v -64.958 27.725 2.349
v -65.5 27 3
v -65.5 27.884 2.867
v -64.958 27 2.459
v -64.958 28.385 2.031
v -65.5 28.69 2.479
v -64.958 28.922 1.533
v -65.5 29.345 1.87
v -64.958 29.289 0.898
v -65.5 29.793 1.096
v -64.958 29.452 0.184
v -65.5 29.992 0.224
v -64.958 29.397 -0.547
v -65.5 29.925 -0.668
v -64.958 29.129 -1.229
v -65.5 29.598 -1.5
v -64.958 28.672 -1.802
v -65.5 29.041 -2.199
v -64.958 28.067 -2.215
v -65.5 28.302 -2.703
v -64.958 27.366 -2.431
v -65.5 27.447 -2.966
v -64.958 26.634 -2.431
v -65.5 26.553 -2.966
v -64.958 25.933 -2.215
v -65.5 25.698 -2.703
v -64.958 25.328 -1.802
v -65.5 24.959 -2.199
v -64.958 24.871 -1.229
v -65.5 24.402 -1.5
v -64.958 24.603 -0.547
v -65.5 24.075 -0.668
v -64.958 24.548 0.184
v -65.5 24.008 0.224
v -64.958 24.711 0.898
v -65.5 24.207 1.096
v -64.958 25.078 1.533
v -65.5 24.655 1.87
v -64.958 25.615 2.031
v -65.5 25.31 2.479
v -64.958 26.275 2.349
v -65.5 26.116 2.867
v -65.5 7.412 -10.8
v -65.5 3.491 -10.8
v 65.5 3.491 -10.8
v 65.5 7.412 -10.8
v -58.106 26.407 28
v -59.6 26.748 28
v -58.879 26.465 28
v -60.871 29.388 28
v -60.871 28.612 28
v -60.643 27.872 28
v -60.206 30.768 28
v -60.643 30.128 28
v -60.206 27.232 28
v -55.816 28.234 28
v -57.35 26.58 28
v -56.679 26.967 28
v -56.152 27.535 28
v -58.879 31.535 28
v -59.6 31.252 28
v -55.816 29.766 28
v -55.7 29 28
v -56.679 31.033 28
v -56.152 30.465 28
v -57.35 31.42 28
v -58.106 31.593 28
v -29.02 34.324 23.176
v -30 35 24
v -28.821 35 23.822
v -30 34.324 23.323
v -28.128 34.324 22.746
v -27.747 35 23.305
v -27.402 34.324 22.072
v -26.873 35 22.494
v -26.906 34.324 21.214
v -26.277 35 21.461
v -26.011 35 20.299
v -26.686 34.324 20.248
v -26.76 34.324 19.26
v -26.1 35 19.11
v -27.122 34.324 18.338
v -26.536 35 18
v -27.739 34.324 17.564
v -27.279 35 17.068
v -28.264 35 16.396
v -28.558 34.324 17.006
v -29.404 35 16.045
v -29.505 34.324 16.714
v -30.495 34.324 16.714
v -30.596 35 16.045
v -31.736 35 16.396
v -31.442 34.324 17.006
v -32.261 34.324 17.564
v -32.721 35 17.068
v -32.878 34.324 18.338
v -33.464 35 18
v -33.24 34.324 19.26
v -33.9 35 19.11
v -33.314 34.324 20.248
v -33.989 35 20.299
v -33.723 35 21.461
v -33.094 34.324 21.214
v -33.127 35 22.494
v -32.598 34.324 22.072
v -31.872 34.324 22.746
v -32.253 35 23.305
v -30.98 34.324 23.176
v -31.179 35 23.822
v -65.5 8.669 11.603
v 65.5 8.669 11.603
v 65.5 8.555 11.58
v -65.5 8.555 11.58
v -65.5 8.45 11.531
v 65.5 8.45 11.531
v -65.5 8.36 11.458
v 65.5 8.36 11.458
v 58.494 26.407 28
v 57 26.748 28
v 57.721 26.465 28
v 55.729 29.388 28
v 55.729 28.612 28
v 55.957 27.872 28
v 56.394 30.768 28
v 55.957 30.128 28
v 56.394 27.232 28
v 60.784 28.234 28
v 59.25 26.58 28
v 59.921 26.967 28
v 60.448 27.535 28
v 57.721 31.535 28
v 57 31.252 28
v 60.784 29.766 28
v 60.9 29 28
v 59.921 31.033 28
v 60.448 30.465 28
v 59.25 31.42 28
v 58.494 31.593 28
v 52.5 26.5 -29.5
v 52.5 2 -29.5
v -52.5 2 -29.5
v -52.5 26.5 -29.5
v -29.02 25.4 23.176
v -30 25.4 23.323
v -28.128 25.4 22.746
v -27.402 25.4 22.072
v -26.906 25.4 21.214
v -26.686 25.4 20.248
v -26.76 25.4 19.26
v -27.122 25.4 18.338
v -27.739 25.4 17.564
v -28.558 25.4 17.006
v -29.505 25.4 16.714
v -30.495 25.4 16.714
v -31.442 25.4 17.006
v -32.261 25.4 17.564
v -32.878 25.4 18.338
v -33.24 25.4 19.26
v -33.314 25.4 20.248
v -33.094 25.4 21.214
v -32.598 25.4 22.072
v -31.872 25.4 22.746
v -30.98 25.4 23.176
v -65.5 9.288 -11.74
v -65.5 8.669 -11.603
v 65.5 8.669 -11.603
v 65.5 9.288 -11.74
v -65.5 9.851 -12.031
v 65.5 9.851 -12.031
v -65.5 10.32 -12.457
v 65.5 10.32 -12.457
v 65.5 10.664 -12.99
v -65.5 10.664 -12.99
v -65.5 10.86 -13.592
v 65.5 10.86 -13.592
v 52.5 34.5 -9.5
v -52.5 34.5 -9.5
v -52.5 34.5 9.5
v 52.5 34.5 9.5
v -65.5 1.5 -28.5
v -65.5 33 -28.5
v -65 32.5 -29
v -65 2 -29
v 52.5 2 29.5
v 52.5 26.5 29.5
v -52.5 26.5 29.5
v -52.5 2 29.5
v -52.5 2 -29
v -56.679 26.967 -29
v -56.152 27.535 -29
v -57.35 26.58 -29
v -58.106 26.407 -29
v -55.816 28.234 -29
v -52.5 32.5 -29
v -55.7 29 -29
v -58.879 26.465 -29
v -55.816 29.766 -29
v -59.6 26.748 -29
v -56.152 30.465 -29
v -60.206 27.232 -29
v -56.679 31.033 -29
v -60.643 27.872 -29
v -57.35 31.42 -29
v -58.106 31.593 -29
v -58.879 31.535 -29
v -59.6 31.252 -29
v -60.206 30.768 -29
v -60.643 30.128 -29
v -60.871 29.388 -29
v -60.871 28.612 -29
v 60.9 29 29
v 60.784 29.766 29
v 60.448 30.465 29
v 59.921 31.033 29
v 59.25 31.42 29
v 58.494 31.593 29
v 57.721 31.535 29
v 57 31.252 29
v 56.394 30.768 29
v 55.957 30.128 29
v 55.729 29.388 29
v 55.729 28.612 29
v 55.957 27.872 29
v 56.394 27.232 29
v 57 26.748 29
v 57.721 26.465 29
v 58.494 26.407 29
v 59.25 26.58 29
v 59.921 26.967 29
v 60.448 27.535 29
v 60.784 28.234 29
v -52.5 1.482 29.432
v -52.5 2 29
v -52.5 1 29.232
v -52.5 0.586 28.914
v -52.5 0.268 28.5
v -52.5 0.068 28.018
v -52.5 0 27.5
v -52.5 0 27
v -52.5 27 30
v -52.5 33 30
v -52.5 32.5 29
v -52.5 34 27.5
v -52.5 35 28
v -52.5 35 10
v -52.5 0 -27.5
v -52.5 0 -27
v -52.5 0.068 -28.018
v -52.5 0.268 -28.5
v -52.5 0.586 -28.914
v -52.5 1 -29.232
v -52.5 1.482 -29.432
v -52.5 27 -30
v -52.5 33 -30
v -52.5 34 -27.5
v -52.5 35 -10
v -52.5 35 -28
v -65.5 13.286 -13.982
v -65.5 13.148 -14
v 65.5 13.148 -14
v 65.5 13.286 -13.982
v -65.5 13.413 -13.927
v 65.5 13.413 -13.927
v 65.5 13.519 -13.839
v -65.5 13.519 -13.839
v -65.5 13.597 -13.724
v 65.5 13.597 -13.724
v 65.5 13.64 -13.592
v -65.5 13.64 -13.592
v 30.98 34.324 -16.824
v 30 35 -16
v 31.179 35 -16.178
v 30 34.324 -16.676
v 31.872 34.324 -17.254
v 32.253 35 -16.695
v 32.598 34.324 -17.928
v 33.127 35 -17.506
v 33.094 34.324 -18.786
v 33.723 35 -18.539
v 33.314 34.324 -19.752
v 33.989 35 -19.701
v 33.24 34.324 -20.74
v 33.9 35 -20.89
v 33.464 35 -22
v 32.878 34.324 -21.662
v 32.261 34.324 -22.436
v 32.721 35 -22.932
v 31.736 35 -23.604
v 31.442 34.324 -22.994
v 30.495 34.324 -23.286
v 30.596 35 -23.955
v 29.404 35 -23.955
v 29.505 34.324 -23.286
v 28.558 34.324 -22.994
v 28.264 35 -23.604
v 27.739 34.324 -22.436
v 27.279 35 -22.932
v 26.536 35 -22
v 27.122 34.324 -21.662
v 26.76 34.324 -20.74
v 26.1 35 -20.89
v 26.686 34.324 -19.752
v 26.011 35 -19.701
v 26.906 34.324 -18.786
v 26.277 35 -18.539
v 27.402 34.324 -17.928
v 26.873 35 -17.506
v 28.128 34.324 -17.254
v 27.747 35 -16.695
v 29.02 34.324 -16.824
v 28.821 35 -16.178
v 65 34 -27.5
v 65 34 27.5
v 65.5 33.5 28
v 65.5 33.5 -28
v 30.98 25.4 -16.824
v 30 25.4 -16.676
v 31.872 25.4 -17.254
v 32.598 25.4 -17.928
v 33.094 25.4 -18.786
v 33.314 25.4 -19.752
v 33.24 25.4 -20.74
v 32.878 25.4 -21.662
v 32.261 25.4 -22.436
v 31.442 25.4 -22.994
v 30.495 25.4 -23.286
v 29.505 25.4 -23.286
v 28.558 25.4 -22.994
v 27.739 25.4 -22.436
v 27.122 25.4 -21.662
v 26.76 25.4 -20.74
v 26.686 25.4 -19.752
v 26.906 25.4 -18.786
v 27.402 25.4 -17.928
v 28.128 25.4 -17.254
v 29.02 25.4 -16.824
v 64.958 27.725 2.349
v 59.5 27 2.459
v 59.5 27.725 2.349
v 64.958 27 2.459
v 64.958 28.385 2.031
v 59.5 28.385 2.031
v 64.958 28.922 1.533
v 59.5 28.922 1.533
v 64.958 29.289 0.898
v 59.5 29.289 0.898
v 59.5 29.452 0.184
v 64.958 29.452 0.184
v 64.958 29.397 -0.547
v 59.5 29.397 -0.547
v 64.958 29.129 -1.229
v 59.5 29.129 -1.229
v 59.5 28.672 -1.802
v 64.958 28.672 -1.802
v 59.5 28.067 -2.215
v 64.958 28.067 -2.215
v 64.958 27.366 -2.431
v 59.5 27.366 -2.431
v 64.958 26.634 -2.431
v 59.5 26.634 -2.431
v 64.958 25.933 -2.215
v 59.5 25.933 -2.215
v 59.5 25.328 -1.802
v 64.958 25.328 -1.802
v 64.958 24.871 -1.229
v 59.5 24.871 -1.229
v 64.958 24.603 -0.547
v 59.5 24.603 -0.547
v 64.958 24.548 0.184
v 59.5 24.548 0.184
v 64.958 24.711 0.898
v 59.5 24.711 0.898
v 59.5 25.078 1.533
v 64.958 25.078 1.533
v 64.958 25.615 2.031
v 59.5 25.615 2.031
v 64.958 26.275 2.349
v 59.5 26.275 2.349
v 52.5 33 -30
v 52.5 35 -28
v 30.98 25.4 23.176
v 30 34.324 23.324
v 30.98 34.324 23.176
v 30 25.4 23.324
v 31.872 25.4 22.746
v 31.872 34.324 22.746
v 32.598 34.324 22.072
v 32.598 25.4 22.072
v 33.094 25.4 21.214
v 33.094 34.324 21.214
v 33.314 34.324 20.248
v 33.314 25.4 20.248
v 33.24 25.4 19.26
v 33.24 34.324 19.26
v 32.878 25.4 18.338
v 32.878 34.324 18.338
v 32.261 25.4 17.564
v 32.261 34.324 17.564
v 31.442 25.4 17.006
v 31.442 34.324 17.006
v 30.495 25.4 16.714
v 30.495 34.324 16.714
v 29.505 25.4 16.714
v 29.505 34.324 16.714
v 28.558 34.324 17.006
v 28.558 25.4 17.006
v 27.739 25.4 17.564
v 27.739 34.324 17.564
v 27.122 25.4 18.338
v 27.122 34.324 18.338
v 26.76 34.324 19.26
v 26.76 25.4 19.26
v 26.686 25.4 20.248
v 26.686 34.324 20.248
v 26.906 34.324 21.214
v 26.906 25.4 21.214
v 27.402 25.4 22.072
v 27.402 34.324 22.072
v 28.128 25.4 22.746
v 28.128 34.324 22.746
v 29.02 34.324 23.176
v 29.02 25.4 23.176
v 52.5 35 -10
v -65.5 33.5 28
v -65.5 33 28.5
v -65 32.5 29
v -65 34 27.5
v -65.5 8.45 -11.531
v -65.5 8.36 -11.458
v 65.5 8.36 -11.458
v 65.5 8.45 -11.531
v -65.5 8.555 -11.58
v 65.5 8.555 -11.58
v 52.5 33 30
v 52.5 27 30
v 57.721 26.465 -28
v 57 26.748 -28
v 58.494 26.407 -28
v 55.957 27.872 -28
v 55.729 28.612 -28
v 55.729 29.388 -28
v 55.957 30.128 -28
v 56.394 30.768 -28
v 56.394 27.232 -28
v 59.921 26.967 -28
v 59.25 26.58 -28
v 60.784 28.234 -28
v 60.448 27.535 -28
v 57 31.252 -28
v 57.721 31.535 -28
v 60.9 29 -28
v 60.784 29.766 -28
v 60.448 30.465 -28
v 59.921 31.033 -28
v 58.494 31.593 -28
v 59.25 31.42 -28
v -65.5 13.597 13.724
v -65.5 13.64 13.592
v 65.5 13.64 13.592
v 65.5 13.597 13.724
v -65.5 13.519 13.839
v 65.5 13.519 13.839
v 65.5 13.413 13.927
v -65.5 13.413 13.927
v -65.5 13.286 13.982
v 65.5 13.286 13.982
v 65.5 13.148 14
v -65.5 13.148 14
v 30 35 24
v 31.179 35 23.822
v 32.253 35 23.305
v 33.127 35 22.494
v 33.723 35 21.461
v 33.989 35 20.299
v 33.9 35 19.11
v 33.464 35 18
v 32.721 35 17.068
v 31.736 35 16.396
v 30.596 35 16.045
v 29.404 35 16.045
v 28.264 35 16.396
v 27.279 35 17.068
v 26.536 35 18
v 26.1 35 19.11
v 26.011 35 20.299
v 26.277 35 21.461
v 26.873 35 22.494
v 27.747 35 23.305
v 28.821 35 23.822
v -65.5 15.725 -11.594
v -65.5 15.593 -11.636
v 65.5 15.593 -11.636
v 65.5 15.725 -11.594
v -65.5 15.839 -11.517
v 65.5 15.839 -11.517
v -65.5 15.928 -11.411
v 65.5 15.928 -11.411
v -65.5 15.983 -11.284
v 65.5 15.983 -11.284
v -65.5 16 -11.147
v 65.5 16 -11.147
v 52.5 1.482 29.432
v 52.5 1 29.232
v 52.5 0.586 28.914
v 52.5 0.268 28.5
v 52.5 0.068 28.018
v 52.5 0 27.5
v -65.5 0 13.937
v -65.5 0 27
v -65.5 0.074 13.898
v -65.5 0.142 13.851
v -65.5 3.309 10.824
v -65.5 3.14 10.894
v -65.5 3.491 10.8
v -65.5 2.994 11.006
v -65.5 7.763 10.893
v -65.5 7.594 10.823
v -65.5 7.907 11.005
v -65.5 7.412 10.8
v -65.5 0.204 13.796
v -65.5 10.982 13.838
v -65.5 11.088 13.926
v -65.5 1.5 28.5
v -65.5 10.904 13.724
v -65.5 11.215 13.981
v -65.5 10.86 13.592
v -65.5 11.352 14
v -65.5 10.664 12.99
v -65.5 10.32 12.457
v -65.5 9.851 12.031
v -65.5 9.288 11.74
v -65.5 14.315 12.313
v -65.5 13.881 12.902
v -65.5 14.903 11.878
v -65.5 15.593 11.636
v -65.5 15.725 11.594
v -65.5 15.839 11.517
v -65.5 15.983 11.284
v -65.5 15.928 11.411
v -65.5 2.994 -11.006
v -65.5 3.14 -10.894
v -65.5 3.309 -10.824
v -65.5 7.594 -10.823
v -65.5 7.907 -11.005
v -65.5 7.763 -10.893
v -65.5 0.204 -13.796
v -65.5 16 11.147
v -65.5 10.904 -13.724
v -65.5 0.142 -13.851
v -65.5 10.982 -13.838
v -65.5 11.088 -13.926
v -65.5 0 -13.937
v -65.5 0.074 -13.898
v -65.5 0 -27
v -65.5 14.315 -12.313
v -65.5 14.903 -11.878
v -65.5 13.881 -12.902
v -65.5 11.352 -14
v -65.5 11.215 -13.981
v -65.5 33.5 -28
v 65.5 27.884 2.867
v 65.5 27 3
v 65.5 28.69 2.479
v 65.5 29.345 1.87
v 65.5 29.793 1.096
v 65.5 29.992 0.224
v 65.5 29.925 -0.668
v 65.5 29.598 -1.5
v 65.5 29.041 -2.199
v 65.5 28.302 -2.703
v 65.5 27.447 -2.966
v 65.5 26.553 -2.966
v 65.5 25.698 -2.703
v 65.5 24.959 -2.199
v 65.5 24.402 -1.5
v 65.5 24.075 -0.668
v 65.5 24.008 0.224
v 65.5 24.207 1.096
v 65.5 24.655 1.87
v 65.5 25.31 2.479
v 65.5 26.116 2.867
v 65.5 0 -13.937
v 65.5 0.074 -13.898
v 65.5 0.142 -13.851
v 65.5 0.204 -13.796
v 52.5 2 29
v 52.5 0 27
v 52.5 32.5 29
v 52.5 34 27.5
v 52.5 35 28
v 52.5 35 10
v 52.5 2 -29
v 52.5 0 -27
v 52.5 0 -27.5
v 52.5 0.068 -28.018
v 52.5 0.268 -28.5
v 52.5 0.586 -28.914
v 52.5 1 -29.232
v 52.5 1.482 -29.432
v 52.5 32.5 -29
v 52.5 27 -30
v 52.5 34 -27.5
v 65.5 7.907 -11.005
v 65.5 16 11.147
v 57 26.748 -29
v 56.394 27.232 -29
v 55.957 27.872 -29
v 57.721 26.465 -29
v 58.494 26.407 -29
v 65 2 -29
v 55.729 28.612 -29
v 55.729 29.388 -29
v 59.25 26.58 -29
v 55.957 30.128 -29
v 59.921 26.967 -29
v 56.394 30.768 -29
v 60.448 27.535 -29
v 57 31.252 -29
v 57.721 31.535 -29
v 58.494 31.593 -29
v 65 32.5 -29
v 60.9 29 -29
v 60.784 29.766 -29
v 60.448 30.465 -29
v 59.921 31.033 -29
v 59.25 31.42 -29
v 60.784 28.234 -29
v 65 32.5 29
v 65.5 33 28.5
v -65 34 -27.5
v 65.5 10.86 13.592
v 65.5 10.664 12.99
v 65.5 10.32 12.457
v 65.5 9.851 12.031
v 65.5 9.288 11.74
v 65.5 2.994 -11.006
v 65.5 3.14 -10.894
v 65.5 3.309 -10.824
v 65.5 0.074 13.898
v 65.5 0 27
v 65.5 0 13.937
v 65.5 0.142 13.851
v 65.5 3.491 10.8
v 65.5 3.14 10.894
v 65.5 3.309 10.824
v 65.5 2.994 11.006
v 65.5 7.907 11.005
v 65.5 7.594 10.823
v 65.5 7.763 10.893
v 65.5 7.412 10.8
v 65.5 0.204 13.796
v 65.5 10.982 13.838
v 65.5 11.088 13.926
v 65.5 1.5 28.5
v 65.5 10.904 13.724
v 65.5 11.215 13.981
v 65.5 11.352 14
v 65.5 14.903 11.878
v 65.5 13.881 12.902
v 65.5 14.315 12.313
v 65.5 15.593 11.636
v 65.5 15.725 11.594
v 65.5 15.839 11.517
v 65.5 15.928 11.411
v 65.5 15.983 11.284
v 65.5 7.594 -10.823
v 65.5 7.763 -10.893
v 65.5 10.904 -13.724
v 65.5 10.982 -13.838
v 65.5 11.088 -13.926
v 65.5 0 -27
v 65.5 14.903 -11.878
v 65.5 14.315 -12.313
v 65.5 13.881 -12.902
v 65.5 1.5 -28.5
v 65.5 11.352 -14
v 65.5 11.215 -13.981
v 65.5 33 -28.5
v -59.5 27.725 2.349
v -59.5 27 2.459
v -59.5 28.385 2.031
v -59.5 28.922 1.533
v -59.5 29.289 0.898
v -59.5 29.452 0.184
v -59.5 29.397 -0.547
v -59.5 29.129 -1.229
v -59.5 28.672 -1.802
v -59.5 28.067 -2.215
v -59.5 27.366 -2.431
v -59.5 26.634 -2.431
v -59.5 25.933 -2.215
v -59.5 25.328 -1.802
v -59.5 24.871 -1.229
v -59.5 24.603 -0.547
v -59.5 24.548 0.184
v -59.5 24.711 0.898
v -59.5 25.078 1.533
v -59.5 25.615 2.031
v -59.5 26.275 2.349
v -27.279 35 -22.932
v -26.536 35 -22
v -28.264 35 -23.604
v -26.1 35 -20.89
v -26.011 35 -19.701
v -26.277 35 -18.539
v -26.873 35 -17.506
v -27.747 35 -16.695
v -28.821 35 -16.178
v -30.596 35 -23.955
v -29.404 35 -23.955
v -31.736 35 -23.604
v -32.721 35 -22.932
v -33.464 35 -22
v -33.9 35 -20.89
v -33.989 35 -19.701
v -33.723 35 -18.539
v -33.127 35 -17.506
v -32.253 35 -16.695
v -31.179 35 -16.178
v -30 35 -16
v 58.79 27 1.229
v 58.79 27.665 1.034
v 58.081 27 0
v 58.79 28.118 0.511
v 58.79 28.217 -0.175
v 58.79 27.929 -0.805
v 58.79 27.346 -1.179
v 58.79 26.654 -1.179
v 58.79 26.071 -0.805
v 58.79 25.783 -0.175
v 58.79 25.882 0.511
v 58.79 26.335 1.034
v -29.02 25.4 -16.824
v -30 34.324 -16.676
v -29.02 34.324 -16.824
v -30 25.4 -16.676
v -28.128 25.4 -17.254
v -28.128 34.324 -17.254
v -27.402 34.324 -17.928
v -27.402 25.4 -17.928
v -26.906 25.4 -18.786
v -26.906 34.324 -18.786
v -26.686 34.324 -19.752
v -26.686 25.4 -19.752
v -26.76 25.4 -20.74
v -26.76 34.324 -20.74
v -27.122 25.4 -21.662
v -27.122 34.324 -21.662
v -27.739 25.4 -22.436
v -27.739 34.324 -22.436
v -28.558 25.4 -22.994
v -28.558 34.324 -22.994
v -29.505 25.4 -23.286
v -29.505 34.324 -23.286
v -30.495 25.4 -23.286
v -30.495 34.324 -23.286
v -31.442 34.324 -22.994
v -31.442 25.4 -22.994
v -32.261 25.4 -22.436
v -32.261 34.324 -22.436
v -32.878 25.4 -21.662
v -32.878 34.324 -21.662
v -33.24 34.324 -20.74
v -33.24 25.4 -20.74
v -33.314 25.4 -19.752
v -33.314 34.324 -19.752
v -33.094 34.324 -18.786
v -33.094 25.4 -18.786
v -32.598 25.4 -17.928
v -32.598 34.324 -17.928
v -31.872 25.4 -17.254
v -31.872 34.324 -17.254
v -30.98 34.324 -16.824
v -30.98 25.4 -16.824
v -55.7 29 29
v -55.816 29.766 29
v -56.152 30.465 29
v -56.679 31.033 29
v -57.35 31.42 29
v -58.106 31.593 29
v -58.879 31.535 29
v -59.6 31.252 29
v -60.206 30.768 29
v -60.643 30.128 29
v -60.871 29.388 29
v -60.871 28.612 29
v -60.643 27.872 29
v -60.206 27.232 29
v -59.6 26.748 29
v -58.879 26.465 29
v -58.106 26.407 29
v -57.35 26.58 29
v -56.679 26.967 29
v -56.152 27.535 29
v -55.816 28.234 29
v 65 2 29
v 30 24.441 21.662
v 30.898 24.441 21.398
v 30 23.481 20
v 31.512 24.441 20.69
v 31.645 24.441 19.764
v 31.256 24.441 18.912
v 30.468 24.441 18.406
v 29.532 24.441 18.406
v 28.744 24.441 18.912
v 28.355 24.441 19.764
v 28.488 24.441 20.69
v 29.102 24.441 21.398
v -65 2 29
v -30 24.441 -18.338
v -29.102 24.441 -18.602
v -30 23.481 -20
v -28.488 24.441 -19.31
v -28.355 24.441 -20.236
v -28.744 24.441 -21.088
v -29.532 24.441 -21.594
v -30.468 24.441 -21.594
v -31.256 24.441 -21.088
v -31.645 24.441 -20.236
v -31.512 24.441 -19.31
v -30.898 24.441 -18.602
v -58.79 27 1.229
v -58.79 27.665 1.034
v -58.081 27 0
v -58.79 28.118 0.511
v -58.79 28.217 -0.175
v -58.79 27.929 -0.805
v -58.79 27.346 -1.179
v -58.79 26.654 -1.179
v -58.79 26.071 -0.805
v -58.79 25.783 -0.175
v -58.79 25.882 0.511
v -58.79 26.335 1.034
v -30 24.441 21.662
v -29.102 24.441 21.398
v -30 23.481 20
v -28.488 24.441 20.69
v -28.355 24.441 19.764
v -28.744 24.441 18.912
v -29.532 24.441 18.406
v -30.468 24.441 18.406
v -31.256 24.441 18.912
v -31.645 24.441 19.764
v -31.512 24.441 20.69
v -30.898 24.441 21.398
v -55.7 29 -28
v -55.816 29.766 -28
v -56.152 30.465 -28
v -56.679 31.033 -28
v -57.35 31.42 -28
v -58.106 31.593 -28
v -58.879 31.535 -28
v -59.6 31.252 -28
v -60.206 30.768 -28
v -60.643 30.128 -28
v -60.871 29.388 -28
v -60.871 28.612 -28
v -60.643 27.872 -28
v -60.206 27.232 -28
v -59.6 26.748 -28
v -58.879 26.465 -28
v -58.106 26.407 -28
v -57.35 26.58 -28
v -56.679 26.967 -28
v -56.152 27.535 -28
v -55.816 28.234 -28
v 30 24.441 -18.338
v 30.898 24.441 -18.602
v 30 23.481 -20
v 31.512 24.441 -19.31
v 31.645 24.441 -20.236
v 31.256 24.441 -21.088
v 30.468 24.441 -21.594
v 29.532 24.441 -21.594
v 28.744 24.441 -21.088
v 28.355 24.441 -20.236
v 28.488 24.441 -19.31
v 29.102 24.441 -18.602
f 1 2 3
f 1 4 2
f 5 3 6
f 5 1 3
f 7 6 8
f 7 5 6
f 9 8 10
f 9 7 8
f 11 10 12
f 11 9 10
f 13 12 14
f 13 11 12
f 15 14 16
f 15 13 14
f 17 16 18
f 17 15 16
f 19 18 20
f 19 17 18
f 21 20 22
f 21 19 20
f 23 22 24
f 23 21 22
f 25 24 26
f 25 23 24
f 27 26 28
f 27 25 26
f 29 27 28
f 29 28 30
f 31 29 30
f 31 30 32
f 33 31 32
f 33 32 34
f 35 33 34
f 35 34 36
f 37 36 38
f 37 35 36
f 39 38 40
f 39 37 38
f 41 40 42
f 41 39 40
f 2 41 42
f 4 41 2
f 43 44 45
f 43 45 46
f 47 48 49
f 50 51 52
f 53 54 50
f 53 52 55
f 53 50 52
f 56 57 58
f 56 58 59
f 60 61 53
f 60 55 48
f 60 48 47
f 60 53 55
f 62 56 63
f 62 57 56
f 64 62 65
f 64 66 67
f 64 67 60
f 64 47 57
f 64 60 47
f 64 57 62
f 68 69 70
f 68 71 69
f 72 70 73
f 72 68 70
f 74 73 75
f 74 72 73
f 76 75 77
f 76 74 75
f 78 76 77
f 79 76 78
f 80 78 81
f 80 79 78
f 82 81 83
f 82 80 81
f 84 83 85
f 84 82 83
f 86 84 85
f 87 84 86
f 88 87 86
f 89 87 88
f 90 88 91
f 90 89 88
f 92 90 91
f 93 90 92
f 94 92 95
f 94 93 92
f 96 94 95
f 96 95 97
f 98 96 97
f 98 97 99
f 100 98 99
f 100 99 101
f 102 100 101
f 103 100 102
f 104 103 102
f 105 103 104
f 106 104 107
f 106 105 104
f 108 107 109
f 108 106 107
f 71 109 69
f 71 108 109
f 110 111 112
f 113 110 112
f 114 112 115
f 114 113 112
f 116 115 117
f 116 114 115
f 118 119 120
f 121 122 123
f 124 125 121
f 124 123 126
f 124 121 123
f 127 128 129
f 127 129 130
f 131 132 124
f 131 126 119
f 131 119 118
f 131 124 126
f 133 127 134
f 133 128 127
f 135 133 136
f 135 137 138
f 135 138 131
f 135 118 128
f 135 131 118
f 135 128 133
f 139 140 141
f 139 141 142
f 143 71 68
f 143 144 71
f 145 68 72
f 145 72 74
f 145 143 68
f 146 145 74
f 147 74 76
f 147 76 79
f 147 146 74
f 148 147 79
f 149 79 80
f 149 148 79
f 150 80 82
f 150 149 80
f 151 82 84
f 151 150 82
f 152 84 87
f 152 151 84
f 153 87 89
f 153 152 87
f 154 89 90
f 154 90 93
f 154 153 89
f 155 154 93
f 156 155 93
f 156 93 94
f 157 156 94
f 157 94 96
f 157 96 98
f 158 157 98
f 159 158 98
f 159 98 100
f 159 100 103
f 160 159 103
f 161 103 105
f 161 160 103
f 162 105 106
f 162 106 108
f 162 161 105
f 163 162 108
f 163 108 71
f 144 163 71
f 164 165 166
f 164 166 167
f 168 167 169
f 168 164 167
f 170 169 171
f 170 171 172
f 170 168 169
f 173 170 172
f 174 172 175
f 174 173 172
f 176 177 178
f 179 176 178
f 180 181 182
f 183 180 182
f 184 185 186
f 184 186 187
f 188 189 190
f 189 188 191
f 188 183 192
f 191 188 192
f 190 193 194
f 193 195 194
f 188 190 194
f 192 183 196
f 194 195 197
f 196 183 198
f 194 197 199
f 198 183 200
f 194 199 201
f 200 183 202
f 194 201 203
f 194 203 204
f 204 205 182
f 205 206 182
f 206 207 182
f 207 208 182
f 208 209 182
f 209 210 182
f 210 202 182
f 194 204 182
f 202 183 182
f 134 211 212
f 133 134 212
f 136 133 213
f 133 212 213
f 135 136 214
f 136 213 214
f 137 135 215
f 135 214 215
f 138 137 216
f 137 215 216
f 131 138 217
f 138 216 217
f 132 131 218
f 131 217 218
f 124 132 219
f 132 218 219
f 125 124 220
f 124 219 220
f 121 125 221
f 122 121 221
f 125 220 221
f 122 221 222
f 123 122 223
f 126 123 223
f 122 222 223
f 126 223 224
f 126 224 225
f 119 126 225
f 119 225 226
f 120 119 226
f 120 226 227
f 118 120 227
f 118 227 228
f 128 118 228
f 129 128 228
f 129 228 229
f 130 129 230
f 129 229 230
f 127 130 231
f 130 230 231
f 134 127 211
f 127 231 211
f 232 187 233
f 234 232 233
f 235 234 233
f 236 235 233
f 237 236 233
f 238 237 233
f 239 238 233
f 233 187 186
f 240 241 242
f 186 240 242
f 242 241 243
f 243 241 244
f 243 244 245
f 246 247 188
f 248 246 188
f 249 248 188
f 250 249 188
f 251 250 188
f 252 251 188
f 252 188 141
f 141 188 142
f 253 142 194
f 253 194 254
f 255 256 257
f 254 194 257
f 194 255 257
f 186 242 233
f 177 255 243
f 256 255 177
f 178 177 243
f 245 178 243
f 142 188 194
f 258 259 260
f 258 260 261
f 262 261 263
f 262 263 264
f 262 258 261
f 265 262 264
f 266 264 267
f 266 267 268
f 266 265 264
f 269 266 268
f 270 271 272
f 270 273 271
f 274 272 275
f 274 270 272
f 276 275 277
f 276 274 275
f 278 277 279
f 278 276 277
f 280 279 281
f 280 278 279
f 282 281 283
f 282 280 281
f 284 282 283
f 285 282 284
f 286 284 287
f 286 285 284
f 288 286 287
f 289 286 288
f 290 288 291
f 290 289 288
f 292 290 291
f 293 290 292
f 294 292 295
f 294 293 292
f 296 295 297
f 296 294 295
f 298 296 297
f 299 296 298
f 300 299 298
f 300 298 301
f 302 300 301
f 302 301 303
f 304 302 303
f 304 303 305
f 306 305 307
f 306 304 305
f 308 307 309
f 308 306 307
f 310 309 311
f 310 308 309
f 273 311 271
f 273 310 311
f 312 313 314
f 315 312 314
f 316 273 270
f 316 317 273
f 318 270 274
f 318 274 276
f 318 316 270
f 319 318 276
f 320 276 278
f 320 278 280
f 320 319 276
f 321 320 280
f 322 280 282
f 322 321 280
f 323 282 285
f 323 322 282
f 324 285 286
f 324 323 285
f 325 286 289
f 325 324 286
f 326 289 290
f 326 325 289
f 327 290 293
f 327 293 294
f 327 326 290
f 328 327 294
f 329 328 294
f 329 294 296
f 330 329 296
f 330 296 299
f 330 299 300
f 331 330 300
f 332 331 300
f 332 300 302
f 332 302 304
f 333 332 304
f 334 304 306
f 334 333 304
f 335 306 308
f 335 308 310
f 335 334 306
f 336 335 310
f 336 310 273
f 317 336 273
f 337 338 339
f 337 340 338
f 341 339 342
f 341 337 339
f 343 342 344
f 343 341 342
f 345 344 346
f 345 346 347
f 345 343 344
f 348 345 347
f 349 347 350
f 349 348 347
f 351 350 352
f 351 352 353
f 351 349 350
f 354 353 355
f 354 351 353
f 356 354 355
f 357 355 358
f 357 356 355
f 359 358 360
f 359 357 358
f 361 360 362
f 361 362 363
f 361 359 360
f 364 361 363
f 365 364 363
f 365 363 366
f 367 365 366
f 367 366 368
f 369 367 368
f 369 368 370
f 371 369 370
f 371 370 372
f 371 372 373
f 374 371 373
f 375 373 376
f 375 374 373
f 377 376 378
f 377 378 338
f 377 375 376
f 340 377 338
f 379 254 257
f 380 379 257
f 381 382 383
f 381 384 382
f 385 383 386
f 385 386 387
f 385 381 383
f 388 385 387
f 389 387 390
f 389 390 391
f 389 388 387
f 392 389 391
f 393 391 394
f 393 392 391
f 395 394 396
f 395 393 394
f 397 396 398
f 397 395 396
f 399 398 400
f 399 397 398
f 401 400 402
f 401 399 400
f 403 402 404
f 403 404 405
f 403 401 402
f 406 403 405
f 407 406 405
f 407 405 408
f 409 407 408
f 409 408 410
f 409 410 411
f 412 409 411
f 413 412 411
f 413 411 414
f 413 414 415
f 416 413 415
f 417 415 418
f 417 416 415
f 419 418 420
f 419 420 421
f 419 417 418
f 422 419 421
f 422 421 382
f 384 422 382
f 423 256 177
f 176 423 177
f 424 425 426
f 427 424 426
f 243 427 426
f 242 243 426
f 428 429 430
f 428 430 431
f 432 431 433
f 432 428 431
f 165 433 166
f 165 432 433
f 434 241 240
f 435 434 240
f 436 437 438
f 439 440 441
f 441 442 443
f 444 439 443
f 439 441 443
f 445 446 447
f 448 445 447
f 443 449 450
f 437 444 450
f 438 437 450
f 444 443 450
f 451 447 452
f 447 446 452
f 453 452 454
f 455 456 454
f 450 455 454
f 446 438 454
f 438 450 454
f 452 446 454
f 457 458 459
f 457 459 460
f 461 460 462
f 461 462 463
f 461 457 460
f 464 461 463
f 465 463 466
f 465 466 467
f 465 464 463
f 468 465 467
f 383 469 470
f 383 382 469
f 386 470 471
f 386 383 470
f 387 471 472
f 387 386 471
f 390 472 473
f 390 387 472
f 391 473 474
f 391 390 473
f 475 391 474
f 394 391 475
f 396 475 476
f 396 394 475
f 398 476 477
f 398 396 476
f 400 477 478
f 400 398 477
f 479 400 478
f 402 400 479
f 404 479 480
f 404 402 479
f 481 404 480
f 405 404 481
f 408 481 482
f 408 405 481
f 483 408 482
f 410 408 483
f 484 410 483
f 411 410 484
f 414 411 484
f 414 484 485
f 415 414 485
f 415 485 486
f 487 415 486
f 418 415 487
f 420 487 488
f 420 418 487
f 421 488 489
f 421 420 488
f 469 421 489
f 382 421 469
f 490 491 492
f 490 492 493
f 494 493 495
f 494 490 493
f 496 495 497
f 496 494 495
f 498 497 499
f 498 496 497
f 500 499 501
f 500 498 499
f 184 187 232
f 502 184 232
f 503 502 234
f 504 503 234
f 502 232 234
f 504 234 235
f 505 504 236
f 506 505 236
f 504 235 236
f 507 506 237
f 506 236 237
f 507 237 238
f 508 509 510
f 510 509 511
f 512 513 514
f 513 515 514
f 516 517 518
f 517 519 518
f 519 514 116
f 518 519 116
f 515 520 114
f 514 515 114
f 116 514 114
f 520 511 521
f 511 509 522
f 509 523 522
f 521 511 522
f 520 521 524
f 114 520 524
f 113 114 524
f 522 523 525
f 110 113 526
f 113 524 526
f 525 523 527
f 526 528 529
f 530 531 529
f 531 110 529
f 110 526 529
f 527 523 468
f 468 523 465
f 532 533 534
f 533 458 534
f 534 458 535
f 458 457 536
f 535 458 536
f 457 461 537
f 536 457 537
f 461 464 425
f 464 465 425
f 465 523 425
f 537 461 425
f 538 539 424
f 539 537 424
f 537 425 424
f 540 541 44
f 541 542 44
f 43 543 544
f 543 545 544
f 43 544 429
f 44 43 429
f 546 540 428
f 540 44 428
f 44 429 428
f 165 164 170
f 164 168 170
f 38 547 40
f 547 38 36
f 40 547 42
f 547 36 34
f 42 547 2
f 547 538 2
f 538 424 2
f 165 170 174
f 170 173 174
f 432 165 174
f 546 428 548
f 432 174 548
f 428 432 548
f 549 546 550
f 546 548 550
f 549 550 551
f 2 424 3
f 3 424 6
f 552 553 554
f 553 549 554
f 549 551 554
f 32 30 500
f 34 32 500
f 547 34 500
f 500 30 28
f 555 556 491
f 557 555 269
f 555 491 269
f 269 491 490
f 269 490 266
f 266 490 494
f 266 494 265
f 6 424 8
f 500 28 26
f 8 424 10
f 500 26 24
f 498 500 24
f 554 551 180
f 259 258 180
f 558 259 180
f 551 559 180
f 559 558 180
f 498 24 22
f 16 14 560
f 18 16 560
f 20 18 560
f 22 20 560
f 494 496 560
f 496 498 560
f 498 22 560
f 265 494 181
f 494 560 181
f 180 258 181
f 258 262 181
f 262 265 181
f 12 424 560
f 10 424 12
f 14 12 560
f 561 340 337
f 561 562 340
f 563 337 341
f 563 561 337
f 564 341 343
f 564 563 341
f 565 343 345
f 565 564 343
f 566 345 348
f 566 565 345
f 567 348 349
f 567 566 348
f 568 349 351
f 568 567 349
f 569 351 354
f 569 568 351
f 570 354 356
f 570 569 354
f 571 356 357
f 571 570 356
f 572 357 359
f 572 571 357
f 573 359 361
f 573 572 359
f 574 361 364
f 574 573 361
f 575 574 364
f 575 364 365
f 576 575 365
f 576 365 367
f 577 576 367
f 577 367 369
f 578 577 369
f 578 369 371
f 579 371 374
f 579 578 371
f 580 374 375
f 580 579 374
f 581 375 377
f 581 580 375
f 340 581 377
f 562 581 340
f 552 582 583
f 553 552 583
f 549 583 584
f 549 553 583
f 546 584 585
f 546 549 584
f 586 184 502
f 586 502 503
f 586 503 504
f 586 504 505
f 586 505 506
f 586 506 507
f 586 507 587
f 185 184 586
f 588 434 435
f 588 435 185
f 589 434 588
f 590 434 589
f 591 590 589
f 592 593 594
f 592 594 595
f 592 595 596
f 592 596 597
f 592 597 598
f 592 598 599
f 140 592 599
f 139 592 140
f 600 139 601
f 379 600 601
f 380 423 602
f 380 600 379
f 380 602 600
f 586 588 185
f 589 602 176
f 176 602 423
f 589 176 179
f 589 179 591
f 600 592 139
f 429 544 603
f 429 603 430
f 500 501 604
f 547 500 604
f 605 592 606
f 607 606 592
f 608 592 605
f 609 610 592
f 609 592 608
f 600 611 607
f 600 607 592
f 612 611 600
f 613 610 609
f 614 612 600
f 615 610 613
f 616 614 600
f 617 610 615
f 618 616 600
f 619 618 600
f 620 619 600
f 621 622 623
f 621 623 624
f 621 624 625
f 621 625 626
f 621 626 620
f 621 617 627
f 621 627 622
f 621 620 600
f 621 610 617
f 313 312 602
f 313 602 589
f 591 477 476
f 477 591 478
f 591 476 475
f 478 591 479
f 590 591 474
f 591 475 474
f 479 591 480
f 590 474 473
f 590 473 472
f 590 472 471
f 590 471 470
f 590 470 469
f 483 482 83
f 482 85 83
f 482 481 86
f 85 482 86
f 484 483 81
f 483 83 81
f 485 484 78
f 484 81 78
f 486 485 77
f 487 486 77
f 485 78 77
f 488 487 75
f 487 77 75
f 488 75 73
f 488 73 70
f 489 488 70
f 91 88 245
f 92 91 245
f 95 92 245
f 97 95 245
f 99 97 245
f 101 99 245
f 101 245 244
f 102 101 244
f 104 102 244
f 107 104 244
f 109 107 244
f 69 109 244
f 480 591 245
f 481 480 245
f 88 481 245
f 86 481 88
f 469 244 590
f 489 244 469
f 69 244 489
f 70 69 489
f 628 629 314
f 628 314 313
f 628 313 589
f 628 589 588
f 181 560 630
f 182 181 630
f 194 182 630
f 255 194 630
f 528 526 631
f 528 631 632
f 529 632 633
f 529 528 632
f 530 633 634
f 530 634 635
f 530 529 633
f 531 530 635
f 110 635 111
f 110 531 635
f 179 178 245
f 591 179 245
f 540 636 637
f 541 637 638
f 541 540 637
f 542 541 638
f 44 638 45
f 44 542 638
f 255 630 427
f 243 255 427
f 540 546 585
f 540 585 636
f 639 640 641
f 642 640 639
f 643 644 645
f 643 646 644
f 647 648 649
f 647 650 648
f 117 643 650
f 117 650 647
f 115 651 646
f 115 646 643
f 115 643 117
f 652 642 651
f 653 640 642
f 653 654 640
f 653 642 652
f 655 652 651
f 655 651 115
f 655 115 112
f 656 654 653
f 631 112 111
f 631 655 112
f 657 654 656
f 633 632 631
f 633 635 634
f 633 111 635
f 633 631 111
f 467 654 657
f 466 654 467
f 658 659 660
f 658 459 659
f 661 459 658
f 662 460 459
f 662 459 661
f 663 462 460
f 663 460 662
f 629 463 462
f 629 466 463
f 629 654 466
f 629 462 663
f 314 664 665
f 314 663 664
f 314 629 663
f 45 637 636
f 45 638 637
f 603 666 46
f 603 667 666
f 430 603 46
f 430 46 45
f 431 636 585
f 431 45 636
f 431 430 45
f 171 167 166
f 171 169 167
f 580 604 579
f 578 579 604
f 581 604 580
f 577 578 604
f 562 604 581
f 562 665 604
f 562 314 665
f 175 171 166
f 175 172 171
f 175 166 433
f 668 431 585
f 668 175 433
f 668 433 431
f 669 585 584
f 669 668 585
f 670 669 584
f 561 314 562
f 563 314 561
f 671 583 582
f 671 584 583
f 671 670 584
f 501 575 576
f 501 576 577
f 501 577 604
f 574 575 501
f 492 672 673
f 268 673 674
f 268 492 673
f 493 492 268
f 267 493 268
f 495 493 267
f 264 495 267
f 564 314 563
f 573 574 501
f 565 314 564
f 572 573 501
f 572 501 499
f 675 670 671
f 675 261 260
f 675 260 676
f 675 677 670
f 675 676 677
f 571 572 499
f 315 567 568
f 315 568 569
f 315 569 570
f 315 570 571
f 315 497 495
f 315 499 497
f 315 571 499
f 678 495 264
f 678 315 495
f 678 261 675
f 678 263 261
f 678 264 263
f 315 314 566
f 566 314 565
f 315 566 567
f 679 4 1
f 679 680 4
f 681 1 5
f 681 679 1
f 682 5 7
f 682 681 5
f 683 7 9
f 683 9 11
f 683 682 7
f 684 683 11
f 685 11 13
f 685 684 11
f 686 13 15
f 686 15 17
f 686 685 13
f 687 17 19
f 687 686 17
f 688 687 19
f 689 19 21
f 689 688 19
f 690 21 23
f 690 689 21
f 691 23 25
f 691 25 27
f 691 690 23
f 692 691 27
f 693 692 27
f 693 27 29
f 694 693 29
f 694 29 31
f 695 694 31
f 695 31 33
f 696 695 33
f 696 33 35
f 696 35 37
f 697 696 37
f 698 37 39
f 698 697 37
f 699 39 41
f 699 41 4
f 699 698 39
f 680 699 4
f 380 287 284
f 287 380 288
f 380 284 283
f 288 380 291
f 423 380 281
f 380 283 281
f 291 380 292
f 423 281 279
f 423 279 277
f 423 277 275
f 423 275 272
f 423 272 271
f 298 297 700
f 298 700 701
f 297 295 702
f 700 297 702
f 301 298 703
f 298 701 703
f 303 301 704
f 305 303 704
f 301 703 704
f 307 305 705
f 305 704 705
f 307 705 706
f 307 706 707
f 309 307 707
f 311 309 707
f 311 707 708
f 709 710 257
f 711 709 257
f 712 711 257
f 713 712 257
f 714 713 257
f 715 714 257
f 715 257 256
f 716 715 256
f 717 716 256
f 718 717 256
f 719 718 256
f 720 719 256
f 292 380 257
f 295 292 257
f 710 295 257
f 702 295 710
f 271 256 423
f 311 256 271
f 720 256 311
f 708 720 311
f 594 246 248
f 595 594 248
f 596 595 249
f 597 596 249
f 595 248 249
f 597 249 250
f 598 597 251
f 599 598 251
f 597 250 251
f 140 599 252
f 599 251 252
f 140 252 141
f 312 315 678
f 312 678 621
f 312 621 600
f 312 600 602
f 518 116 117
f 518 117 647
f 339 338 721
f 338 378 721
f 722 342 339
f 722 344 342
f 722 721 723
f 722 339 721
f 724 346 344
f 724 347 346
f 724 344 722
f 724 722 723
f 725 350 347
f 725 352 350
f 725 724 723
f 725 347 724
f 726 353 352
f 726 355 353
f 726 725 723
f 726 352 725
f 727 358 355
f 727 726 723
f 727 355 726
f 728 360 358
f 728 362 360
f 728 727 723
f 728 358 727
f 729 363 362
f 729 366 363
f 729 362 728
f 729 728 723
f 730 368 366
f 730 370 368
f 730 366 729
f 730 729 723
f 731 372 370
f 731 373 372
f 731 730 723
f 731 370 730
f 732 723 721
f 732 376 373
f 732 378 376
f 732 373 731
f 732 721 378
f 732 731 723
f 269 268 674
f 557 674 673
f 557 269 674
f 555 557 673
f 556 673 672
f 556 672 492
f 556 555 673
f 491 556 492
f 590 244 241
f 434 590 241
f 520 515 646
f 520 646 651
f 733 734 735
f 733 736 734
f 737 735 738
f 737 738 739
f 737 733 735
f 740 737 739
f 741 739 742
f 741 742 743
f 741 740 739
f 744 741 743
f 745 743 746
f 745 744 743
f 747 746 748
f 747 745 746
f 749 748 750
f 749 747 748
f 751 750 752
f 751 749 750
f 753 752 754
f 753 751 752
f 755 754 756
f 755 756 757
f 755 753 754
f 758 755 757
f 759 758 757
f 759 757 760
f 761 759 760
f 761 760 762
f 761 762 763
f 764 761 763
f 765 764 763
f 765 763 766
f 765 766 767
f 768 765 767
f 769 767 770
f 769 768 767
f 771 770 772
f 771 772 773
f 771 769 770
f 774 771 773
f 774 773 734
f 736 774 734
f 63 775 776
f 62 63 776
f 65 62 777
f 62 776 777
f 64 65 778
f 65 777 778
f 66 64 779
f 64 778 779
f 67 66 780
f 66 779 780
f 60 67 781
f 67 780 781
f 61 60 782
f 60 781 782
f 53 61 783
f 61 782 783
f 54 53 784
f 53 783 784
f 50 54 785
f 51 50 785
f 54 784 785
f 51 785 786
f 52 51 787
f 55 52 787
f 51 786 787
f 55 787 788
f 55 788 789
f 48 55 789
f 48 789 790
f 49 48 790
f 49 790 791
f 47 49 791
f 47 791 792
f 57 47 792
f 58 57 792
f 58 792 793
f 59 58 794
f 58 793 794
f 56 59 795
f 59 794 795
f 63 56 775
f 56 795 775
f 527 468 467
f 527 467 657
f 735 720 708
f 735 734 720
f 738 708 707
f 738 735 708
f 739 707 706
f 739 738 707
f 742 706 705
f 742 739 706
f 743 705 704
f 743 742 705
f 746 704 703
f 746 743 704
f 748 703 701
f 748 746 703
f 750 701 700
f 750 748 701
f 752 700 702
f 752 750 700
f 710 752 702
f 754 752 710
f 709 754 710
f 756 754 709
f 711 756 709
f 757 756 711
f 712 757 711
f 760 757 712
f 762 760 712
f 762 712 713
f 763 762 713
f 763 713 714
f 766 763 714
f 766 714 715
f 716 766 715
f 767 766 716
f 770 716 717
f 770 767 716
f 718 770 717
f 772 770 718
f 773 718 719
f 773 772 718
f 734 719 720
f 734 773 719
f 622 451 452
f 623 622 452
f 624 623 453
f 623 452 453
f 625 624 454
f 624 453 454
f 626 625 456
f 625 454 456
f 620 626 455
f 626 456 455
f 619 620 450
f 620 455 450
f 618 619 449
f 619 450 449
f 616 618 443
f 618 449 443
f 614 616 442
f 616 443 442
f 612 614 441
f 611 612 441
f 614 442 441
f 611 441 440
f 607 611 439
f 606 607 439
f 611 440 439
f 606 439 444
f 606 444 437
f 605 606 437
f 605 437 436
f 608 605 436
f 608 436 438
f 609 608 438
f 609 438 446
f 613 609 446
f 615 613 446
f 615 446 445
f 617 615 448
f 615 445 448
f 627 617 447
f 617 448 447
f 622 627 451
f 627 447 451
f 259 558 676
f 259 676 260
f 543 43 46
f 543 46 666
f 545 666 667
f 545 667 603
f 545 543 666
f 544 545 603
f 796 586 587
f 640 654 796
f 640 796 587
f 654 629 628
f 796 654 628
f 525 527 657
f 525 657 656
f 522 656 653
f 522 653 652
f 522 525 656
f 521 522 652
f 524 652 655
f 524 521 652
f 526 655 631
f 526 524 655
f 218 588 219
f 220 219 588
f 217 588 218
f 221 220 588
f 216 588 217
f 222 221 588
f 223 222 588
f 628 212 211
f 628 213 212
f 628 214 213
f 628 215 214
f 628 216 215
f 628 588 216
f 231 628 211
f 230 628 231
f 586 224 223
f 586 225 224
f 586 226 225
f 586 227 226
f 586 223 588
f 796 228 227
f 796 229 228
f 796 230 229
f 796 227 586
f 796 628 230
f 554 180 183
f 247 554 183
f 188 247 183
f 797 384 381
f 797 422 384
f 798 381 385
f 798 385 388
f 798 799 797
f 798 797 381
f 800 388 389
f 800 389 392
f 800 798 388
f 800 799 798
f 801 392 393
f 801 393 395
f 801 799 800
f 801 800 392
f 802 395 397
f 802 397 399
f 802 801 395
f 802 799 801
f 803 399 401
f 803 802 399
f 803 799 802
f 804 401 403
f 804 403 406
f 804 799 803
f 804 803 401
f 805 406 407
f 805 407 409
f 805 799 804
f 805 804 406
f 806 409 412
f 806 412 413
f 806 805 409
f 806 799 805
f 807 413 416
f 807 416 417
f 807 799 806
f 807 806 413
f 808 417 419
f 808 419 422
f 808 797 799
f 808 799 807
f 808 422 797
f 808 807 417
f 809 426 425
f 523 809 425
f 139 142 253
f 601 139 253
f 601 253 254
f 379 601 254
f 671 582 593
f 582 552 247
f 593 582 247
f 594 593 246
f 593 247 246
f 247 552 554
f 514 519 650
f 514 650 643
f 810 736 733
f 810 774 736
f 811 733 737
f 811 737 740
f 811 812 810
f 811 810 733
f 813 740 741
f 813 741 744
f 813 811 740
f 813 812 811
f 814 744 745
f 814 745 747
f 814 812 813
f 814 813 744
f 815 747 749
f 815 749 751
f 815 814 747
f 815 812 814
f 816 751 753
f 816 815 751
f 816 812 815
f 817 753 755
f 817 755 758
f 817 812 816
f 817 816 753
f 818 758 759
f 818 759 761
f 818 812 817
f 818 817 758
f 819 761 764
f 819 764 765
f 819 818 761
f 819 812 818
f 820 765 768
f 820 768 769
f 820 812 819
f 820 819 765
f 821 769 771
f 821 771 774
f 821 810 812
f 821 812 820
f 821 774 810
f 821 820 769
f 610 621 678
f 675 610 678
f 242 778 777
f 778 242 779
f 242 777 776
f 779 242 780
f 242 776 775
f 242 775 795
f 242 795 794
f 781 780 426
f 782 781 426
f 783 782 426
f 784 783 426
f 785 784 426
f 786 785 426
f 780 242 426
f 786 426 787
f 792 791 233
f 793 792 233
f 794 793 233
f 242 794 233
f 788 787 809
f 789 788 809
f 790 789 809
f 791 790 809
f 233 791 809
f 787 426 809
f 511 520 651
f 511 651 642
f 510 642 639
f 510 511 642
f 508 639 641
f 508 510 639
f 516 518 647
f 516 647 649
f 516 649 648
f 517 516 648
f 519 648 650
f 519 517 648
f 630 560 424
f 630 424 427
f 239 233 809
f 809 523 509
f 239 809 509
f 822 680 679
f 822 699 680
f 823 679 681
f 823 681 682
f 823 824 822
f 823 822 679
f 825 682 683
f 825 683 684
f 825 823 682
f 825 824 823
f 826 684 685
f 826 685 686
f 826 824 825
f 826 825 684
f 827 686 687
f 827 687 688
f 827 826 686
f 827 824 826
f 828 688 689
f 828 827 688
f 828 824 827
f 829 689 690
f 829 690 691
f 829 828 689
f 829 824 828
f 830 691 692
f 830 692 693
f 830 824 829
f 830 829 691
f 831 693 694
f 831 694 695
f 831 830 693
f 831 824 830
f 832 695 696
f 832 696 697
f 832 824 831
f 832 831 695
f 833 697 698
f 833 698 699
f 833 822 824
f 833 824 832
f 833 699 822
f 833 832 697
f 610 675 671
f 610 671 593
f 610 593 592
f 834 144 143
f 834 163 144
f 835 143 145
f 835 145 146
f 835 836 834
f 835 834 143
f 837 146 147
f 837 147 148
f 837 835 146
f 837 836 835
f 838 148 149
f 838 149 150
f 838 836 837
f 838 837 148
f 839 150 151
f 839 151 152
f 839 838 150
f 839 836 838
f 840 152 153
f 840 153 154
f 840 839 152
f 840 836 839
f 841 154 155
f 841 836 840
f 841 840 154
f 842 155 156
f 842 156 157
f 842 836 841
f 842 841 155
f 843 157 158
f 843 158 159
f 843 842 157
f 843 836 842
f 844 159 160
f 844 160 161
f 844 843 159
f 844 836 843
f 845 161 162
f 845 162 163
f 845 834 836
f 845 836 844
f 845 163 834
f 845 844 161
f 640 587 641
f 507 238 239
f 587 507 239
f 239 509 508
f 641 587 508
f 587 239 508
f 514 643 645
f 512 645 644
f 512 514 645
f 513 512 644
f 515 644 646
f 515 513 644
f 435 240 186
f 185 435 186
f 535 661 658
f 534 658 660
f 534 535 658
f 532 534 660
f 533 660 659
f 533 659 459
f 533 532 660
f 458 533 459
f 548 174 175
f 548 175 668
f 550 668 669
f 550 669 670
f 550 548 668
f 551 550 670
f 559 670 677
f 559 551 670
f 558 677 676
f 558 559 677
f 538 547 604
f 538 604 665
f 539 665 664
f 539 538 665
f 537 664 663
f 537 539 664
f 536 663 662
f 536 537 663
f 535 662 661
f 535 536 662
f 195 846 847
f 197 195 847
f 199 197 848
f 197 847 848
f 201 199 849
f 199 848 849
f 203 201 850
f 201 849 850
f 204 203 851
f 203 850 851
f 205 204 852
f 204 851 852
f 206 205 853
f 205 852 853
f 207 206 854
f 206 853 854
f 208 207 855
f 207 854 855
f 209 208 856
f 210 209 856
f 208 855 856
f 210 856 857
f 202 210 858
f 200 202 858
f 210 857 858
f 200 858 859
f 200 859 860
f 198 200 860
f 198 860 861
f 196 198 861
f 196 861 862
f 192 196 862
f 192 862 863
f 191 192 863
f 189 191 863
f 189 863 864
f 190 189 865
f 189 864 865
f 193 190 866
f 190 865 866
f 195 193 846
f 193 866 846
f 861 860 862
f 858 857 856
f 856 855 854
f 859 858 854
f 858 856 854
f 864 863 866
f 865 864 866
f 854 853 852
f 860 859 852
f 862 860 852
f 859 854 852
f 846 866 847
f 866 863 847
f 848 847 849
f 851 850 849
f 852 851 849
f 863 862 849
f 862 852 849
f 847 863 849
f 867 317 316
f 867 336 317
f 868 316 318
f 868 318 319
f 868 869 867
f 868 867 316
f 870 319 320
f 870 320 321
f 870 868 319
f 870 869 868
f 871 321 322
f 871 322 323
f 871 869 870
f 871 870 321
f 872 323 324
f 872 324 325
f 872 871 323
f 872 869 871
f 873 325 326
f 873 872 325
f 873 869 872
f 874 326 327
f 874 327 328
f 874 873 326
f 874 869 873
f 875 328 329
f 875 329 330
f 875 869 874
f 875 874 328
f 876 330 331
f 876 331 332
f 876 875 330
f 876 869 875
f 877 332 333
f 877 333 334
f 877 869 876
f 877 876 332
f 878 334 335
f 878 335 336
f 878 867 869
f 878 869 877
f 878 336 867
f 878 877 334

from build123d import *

# Parameters (mm, degrees)
BOSS_EXTRUDE1_DEPTH      = 52.5
BOSS_EXTRUDE1_DEPTH_BACK = 52.5
BOSS_EXTRUDE2_DEPTH      = 13
BOSS_EXTRUDE3_DEPTH      = 13
CUT_EXTRUDE1_DEPTH       = 65.5
CUT_EXTRUDE1_DEPTH_BACK  = 65.5
CUT_EXTRUDE2_DEPTH       = 29
CUT_EXTRUDE2_DEPTH_BACK  = 29
CUT_EXTRUDE3_DEPTH       = 29
CUT_EXTRUDE3_DEPTH_BACK  = 29
SKETCH7_R                = 2.6
CUT_EXTRUDE4_DEPTH       = 1
SKETCH8_R                = 2.6
CUT_EXTRUDE5_DEPTH       = 1
CUT_EXTRUDE6_START       = 1
SKETCH9_R                = 2.6
CUT_EXTRUDE6_DEPTH       = 1
CUT_EXTRUDE7_START       = 1
SKETCH10_R               = 2.6
CUT_EXTRUDE7_DEPTH       = 1
CUT_EXTRUDE8_DEPTH       = 35
CUT_EXTRUDE9_DEPTH       = 35


with BuildPart() as part:
    # Sketch1 → Boss-Extrude1 (new, two sides: drawn at the far end of the back side and taken through both)
    with BuildSketch(Plane(origin=(0, 0, 0), x_dir=(0, 0, -1), z_dir=(1, 0, 0)).offset(-BOSS_EXTRUDE1_DEPTH_BACK)):
        with BuildLine():
            Line((-30, 33), (-30, 27))
            Line((-30, 27), (-29.5, 26.5))
            Line((-29.5, 26.5), (-29.5, 2))
            ThreePointArc((-29.5, 2), (-28.914213562, 0.585786438), (-27.5, 0))
            Line((-27.5, 0), (27.5, 0))
            ThreePointArc((27.5, 0), (28.914213562, 0.585786438), (29.5, 2))
            Line((29.5, 2), (29.5, 26.5))
            Line((29.5, 26.5), (30, 27))
            Line((30, 27), (30, 33))
            Line((30, 33), (28, 35))
            Line((28, 35), (10, 35))
            Line((10, 35), (9.5, 34.5))
            Line((9.5, 34.5), (-9.5, 34.5))
            Line((-9.5, 34.5), (-10, 35))
            Line((-10, 35), (-28, 35))
            Line((-28, 35), (-30, 33))
        make_face()
    extrude(amount=BOSS_EXTRUDE1_DEPTH + BOSS_EXTRUDE1_DEPTH_BACK)

    # Sketch2 → Boss-Extrude2 (add)
    with BuildSketch(Plane(origin=(-65.5, 0, 0), x_dir=(0, 0, -1), z_dir=(1, 0, 0))):
        Polygon((-29, 2), (-27, 0), (27, 0), (29, 2), (29, 32.5), (27.5, 34), (-27.5, 34), (-29, 32.5), align=None)
    extrude(amount=BOSS_EXTRUDE2_DEPTH)

    # Sketch3 → Boss-Extrude3 (add)
    with BuildSketch(Plane(origin=(65.5, 0, 0), x_dir=(0, 0, -1), z_dir=(1, 0, 0))):
        Polygon((-29, 2), (-27, 0), (27, 0), (29, 2), (29, 32.5), (27.5, 34), (-27.5, 34), (-29, 32.5), align=None)
    extrude(amount=-BOSS_EXTRUDE3_DEPTH)

    # Sketch4 → Cut-Extrude1 (cut, two sides: drawn at the far end of the back side and taken through both)
    with BuildSketch(Plane(origin=(0, 0, 0), x_dir=(0, 0, -1), z_dir=(1, 0, 0)).offset(-CUT_EXTRUDE1_DEPTH_BACK)):
        with BuildLine():
            Line((-14, 13.148439), (-14, 11.35158))
            ThreePointArc((-14, 11.35158), (-13.885407957, 11.031881418), (-13.592386868, 10.860192277))
            ThreePointArc((-13.592386868, 10.860192277), (-12.229021504, 10.099202354), (-11.602627372, 8.66899217))
            ThreePointArc((-11.602627372, 8.66899217), (-11.559004129, 8.501191683), (-11.458152391, 8.360163609))
            Line((-11.458152391, 8.360163609), (-11.005017, 7.906991))
            ThreePointArc((-11.005017, 7.906991), (-10.852063473, 7.680418582), (-10.800003, 7.412054))
            Line((-10.800003, 7.412054), (-10.800003, 3.490777069))
            ThreePointArc((-10.800003, 3.490777069), (-10.853443426, 3.222114259), (-11.005628687, 2.994352913))
            Line((-11.005628687, 2.994352913), (-13.795574427, 0.204407575))
            ThreePointArc((-13.795574427, 0.204407575), (-13.946871354, -0.022023954), (-14, -0.289118216))
            Line((-14, -0.289118216), (-14, -5.5))
            Line((-14, -5.5), (-12.5, -7))
            Line((-12.5, -7), (-5.0000003, -7))
            Line((-5.0000003, -7), (-4.499985, -6.50000763))
            Line((-4.499985, -6.50000763), (4.499985, -6.50000763))
            Line((4.499985, -6.50000763), (5.0000003, -7))
            Line((5.0000003, -7), (12.5, -7))
            Line((12.5, -7), (14, -5.5))
            Line((14, -5.5), (14, -0.289118216))
            ThreePointArc((14, -0.289118216), (13.946871354, -0.022023954), (13.795574427, 0.204407575))
            Line((13.795574427, 0.204407575), (11.005628687, 2.994352913))
            ThreePointArc((11.005628687, 2.994352913), (10.853443426, 3.222114259), (10.800003, 3.490777069))
            Line((10.800003, 3.490777069), (10.800003, 7.412054))
            ThreePointArc((10.800003, 7.412054), (10.852063473, 7.680418582), (11.005017, 7.906991))
            Line((11.005017, 7.906991), (11.458152391, 8.360163609))
            ThreePointArc((11.458152391, 8.360163609), (11.559004129, 8.501191683), (11.602627372, 8.66899217))
            ThreePointArc((11.602627372, 8.66899217), (12.229021504, 10.099202354), (13.592386868, 10.860192277))
            ThreePointArc((13.592386868, 10.860192277), (13.885407957, 11.031881418), (14, 11.35158))
            Line((14, 11.35158), (14, 13.148439))
            ThreePointArc((14, 13.148439), (13.886532321, 13.469052961), (13.5924176, 13.639829881))
            ThreePointArc((13.5924176, 13.639829881), (12.312672018, 14.314596081), (11.635789981, 15.593223817))
            ThreePointArc((11.635789981, 15.593223817), (11.466717508, 15.887148006), (11.146965482, 16))
            Line((11.146965482, 16), (-11.146965482, 16))
            ThreePointArc((-11.146965482, 16), (-11.466717508, 15.887148006), (-11.635789981, 15.593223817))
            ThreePointArc((-11.635789981, 15.593223817), (-12.312672018, 14.314596081), (-13.5924176, 13.639829881))
            ThreePointArc((-13.5924176, 13.639829881), (-13.886532321, 13.469052961), (-14, 13.148439))
        make_face()
    extrude(amount=CUT_EXTRUDE1_DEPTH + CUT_EXTRUDE1_DEPTH_BACK, mode=Mode.SUBTRACT)

    # Sketch5 → Cut-Extrude2 (cut, two sides: drawn at the far end of the back side and taken through both)
    with BuildSketch(Plane.XY.offset(-CUT_EXTRUDE2_DEPTH_BACK)):
        Polygon((-65.5, 33.5), (-65, 34), (-65.5, 34), align=None)
    extrude(amount=CUT_EXTRUDE2_DEPTH + CUT_EXTRUDE2_DEPTH_BACK, mode=Mode.SUBTRACT)

    # Sketch6 → Cut-Extrude3 (cut, two sides: drawn at the far end of the back side and taken through both)
    with BuildSketch(Plane.XY.offset(-CUT_EXTRUDE3_DEPTH_BACK)):
        Polygon((65, 34), (65.5, 33.5), (65.5, 34), align=None)
    extrude(amount=CUT_EXTRUDE3_DEPTH + CUT_EXTRUDE3_DEPTH_BACK, mode=Mode.SUBTRACT)

    # Sketch7 → Cut-Extrude4 (cut)
    with BuildSketch(Plane.XY.offset(29)):
        with Locations((58.3, 29)):
            Circle(SKETCH7_R)
    extrude(amount=-CUT_EXTRUDE4_DEPTH, mode=Mode.SUBTRACT)

    # Sketch8 → Cut-Extrude5 (cut)
    with BuildSketch(Plane.XY.offset(29)):
        with Locations((-58.3, 29)):
            Circle(SKETCH8_R)
    extrude(amount=-CUT_EXTRUDE5_DEPTH, mode=Mode.SUBTRACT)

    # Sketch9 → Cut-Extrude6 (cut)
    with BuildSketch(Plane.XY.offset(-29).offset(CUT_EXTRUDE6_START)):
        with Locations((58.3, 29)):
            Circle(SKETCH9_R)
    extrude(amount=-CUT_EXTRUDE6_DEPTH, mode=Mode.SUBTRACT)

    # Sketch10 → Cut-Extrude7 (cut)
    with BuildSketch(Plane.XY.offset(-29).offset(CUT_EXTRUDE7_START)):
        with Locations((-58.3, 29)):
            Circle(SKETCH10_R)
    extrude(amount=-CUT_EXTRUDE7_DEPTH, mode=Mode.SUBTRACT)

    # Sketch11 → Cut-Revolve1 (revolve, cut)
    with BuildSketch(Plane.XY):
        Polygon((-65.5, 27), (-65.5, 30), (-64.9585, 29.4585), (-59.5, 29.4585), (-58.080584363, 27), align=None)
    revolve(axis=Axis((-58.080584363, 27, 0), (-1, 0, 0)), mode=Mode.SUBTRACT)

    # Sketch12 → Cut-Revolve2 (revolve, cut)
    with BuildSketch(Plane.XY):
        Polygon((58.080584363, 27), (59.5, 29.4585), (64.9585, 29.4585), (65.5, 30), (65.5, 27), align=None)
    revolve(axis=Axis((65.5, 27, 0), (-1, 0, 0)), mode=Mode.SUBTRACT)

    # Sketch13 → Cut-Revolve3 (revolve, cut)
    with BuildSketch(Plane.XY.offset(20)):
        Polygon((-30, 35), (-26, 35), (-26.6765, 34.3235), (-26.6765, 25.4), (-30, 23.48117638), align=None)
    revolve(axis=Axis((-30, 23.48117638, 20), (0, 1, 0)), mode=Mode.SUBTRACT)

    # Sketch14 → Cut-Revolve4 (revolve, cut)
    with BuildSketch(Plane.XY.offset(20)):
        Polygon((30, 35), (34, 35), (33.3235, 34.3235), (33.3235, 25.4), (30, 23.48117638), align=None)
    revolve(axis=Axis((30, 23.48117638, 20), (0, 1, 0)), mode=Mode.SUBTRACT)

    # Sketch15 → Cut-Revolve5 (revolve, cut)
    with BuildSketch(Plane.XY.offset(-20)):
        Polygon((-30, 35), (-26, 35), (-26.6765, 34.3235), (-26.6765, 25.4), (-30, 23.48117638), align=None)
    revolve(axis=Axis((-30, 23.48117638, -20), (0, 1, 0)), mode=Mode.SUBTRACT)

    # Sketch16 → Cut-Revolve6 (revolve, cut)
    with BuildSketch(Plane.XY.offset(-20)):
        Polygon((30, 35), (34, 35), (33.3235, 34.3235), (33.3235, 25.4), (30, 23.48117638), align=None)
    revolve(axis=Axis((30, 23.48117638, -20), (0, 1, 0)), mode=Mode.SUBTRACT)

    # Sketch17 → Cut-Extrude8 (cut)
    with BuildSketch(Plane(origin=(0, 0, 0), x_dir=(1, 0, 0), z_dir=(0, 1, 0))):
        Polygon((-130.5, 29.5), (-130.5, -29.5), (-65, -29.5), (-65, -29), (-65.5, -28.5), (-65.5, -29), (-130, -29), (-130, 29), (-65.5, 29), (-65.5, 28.5), (-65, 29), (-65, 29.5), align=None)
    extrude(amount=CUT_EXTRUDE8_DEPTH, mode=Mode.SUBTRACT)

    # Sketch18 → Cut-Extrude9 (cut)
    with BuildSketch(Plane(origin=(0, 0, 0), x_dir=(1, 0, 0), z_dir=(0, 1, 0))):
        Polygon((65, -29), (65, -29.5), (130.5, -29.5), (130.5, 29.5), (65, 29.5), (65, 29), (65.5, 28.5), (65.5, 29), (130, 29), (130, -29), (65.5, -29), (65.5, -28.5), align=None)
    extrude(amount=CUT_EXTRUDE9_DEPTH, mode=Mode.SUBTRACT)


solid = part.part
